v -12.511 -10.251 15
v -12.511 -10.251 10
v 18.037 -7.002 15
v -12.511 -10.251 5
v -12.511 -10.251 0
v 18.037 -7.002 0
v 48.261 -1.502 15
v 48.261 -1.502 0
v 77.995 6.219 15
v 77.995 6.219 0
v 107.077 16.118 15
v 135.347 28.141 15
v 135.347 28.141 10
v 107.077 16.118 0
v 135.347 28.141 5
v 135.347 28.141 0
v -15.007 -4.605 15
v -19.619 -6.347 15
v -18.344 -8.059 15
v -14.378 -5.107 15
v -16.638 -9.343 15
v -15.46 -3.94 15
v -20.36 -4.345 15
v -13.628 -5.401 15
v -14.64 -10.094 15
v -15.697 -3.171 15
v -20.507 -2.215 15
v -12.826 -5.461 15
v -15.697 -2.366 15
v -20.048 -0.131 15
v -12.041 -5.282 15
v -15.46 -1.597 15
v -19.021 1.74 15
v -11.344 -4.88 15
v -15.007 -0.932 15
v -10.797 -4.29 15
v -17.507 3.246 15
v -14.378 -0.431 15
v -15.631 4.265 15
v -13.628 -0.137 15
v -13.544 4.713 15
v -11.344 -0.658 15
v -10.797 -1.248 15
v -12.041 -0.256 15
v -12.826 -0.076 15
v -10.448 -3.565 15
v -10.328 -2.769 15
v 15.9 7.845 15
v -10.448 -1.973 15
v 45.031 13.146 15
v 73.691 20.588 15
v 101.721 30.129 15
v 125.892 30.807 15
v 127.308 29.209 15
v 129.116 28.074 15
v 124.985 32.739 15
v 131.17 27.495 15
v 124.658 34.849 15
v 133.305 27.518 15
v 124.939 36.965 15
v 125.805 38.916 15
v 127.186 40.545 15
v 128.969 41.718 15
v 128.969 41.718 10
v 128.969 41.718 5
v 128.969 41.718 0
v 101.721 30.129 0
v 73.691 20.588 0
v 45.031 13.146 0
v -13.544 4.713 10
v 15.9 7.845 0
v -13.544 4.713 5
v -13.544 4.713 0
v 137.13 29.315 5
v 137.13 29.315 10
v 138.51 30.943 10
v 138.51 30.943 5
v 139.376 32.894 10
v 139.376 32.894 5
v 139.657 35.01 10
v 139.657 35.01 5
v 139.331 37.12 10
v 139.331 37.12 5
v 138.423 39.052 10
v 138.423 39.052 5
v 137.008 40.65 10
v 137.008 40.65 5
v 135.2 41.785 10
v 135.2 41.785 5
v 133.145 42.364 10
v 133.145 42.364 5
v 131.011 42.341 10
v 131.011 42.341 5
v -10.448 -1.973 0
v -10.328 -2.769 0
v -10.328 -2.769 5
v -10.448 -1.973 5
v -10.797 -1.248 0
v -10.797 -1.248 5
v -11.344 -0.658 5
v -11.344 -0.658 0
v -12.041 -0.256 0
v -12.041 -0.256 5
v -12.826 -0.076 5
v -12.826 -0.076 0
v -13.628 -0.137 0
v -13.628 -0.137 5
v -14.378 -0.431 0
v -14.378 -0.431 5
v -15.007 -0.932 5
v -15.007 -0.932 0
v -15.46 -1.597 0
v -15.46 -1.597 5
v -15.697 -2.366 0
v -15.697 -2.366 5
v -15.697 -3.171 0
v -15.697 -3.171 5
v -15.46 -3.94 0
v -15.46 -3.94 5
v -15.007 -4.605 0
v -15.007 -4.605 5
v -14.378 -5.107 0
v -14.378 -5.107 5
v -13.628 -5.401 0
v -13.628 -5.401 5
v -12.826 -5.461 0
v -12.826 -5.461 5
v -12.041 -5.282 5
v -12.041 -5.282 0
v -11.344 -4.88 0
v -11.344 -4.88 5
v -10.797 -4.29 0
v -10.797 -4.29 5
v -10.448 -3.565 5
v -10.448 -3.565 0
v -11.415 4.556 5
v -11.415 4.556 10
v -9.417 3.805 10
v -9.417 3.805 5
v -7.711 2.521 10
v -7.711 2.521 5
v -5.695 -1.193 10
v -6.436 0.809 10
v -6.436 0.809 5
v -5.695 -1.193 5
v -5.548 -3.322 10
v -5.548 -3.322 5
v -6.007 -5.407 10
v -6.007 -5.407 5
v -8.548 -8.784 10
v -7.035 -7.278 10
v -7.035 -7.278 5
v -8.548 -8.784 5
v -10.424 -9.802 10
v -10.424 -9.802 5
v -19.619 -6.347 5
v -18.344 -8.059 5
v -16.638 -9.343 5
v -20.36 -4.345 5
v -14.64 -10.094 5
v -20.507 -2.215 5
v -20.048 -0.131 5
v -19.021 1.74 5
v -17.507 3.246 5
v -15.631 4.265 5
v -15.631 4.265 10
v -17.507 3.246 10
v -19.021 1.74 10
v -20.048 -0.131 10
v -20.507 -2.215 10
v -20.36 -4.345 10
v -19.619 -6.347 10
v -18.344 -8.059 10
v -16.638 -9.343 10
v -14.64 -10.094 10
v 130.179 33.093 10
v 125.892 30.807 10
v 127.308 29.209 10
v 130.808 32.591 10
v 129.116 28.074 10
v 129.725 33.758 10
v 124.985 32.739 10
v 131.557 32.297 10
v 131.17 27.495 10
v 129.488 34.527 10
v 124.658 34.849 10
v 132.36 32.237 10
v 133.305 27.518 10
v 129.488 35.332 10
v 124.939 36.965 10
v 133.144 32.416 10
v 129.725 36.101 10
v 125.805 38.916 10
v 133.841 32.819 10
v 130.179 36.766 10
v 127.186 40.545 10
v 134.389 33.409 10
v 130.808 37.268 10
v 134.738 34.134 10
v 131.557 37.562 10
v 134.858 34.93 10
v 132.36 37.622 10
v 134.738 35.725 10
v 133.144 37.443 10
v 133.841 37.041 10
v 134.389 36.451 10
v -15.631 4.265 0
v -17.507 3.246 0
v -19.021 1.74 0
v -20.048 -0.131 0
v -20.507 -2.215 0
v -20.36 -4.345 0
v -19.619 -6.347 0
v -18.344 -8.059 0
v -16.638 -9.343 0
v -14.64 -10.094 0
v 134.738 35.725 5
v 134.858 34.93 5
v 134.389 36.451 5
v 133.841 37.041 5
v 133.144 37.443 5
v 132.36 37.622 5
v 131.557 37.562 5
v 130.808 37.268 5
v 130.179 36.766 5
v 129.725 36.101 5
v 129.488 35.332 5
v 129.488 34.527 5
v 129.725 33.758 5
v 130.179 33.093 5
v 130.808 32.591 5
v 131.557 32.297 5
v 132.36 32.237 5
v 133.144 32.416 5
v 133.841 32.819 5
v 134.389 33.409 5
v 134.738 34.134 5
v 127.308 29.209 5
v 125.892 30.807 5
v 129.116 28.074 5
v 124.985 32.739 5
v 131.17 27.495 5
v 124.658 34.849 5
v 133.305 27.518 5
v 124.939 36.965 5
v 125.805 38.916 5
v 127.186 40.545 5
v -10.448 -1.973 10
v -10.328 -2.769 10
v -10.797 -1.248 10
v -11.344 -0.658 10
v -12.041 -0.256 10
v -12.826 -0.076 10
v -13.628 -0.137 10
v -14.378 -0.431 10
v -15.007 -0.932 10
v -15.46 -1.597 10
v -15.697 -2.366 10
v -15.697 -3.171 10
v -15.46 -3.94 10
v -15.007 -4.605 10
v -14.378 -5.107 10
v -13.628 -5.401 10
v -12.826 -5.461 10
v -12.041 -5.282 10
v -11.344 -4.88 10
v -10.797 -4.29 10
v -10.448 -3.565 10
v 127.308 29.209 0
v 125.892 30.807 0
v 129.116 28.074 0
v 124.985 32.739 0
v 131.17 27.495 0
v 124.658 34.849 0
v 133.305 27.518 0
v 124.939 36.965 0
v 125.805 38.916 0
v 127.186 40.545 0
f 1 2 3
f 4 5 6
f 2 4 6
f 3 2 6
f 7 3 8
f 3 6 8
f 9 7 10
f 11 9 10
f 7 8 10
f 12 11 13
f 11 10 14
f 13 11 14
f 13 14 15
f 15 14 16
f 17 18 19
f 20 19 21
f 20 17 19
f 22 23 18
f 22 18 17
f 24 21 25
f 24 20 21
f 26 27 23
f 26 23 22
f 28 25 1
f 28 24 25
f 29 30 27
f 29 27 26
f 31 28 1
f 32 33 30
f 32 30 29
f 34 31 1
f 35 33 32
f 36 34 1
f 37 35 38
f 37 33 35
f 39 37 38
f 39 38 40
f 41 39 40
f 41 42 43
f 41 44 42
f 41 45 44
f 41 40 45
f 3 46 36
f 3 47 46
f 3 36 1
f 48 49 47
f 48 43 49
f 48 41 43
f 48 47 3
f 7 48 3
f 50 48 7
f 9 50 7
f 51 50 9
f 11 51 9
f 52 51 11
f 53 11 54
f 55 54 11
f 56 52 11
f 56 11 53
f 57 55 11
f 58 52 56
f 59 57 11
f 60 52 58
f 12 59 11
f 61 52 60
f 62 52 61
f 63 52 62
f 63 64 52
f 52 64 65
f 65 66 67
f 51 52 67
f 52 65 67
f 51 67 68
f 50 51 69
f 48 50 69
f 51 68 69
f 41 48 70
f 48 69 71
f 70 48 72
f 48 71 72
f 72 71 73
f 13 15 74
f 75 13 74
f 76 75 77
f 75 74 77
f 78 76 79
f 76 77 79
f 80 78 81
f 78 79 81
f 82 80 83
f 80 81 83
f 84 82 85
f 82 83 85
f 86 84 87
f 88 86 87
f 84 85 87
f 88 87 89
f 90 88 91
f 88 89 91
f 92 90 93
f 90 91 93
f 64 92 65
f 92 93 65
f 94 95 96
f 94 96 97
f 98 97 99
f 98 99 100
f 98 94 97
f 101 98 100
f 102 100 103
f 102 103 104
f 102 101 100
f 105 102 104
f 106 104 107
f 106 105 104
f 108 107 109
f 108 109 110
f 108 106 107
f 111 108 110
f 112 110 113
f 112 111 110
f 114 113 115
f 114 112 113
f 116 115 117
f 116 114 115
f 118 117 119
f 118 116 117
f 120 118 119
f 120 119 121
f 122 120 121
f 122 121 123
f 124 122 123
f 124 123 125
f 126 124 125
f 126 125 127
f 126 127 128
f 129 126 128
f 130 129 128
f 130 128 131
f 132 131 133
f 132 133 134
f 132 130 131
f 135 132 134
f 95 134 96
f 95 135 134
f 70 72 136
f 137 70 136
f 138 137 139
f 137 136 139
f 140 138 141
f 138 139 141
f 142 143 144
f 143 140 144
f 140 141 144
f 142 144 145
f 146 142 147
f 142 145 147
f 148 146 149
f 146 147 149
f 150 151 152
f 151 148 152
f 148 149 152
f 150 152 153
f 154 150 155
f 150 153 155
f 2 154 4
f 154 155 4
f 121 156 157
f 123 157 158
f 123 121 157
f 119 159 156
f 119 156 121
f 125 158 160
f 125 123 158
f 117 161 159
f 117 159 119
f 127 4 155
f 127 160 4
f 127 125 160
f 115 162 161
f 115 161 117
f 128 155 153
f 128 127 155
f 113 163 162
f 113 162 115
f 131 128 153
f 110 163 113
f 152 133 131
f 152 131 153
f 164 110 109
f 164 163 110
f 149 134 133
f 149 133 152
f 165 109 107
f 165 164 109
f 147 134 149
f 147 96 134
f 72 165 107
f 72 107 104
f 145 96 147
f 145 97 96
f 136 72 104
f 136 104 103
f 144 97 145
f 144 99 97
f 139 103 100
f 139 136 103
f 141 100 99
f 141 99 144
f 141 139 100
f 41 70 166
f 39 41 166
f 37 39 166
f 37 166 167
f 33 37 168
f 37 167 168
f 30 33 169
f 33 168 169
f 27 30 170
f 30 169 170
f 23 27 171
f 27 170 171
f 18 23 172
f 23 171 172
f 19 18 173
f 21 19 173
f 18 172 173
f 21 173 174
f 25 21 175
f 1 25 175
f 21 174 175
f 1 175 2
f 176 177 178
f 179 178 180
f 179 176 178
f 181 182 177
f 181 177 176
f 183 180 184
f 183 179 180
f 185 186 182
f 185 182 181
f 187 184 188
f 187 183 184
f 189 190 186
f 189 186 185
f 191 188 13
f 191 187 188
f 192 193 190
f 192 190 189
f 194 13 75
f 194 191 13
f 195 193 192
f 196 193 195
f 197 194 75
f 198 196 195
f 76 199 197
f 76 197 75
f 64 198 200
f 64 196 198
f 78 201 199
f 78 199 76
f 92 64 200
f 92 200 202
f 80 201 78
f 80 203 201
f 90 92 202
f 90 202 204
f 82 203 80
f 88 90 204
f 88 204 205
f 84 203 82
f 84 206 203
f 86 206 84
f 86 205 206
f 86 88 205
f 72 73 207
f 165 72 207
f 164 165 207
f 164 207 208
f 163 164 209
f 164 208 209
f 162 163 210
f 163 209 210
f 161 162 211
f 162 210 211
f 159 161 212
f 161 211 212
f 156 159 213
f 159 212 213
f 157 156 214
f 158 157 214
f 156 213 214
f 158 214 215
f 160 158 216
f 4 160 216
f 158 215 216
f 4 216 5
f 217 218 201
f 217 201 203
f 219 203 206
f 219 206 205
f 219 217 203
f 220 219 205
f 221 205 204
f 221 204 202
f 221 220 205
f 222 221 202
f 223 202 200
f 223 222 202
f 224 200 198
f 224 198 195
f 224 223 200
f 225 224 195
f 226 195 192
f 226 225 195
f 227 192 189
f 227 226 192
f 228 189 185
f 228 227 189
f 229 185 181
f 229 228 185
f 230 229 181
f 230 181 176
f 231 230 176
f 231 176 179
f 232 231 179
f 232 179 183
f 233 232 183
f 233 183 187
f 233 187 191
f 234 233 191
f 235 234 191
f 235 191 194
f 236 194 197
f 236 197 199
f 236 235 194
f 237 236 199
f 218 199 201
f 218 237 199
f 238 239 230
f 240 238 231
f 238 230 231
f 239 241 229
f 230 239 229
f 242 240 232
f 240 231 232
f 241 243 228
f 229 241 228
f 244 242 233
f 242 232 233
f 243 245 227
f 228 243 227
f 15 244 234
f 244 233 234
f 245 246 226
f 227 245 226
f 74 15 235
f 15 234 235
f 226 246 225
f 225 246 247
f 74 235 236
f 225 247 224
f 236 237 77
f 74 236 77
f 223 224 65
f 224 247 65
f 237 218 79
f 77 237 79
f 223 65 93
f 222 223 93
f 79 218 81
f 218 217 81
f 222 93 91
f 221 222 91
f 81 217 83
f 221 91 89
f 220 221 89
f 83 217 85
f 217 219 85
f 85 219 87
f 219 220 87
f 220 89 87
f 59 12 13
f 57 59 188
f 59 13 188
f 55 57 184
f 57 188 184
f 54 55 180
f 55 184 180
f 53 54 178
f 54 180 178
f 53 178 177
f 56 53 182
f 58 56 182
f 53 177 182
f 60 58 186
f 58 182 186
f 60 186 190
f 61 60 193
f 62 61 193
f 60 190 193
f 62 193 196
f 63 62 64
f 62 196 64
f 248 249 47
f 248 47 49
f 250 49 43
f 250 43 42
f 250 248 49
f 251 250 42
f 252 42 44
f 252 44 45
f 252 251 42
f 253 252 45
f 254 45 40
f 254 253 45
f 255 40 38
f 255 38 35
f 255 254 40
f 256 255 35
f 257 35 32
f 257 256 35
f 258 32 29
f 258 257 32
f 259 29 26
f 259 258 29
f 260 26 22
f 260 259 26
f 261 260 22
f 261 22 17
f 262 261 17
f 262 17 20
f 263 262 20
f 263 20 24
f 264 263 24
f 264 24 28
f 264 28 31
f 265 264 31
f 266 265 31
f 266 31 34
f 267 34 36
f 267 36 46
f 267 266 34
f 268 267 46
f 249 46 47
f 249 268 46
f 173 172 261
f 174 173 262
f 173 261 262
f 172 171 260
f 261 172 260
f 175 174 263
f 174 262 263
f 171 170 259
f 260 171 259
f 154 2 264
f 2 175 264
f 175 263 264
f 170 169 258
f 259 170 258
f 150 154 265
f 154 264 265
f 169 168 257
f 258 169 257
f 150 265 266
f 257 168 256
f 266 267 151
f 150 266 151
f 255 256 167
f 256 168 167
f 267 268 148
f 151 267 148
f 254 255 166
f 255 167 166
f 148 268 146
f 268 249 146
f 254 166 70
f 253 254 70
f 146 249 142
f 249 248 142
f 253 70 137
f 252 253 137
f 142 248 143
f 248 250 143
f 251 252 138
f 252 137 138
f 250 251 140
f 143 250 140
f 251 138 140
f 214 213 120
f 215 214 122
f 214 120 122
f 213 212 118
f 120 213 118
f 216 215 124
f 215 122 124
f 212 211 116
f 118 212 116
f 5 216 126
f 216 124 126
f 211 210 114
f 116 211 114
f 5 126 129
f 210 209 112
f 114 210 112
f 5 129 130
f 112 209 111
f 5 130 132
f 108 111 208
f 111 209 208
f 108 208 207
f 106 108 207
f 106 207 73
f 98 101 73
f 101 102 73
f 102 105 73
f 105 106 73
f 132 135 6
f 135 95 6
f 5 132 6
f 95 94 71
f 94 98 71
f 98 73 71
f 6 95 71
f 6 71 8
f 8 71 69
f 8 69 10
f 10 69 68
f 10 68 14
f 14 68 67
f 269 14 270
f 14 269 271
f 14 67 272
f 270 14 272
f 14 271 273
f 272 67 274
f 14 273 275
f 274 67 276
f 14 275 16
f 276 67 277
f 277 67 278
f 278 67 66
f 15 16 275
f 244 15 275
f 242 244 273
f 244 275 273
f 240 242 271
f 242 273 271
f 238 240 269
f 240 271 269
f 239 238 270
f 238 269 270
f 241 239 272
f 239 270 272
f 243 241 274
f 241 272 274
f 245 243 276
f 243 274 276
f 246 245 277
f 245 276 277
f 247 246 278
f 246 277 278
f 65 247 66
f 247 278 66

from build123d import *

# Parameters (mm, degrees)
F1_DEPTH = 15
F0_R     = 2.7
F2_DEPTH = 5
F3_START = 10
F3_DEPTH = 5
F4_START = 5
F4_DEPTH = 5


with BuildPart() as f1:
    # F0 (on Top) → F1 (new body)
    with BuildSketch(Plane.XY):
        with BuildLine():
            ThreePointArc((128.9690721838, 41.7179030249), (59.4297181842, 16.601757413), (-13.5443023154, 4.7133236555))
            ThreePointArc((-13.5443023154, 4.7133236555), (-5.5454612916, -2.2522016138), (-12.5109865609, -10.2510426376))
            ThreePointArc((-12.5109865609, -10.2510426376), (63.1995597074, 2.0832073859), (135.346639482, 28.1412084582))
            ThreePointArc((135.346639482, 28.1412084582), (125.3695085496, 31.7407720924), (128.9690721838, 41.7179030249))
        make_face()
    extrude(amount=F1_DEPTH)

    # F0 (on Top) → F2 (join)
    with BuildSketch(Plane.XY):
        with BuildLine():
            ThreePointArc((-12.5109865609, -10.2510426376), (-5.5454612916, -2.2522016138), (-13.5443023154, 4.7133236555))
            ThreePointArc((-13.5443023154, 4.7133236555), (-20.5098275846, -3.2855173683), (-12.5109865609, -10.2510426376))
        make_face()
        with Locations((-13.0276444381, -2.768859491)):
            Circle(F0_R, mode=Mode.SUBTRACT)
    extrude(amount=F2_DEPTH)

    # F0 (on Top) → F3 (join)
    with BuildSketch(Plane.XY.offset(F3_START)):
        with BuildLine():
            ThreePointArc((-12.5109865609, -10.2510426376), (-5.5454612916, -2.2522016138), (-13.5443023154, 4.7133236555))
            ThreePointArc((-13.5443023154, 4.7133236555), (-20.5098275846, -3.2855173683), (-12.5109865609, -10.2510426376))
        make_face()
        with Locations((-13.0276444381, -2.768859491)):
            Circle(F0_R, mode=Mode.SUBTRACT)
    extrude(amount=F3_DEPTH)

    # F0 (on Top) → F4 (join)
    with BuildSketch(Plane.XY.offset(F4_START)):
        with BuildLine():
            ThreePointArc((135.346639482, 28.1412084582), (138.9462031162, 38.1183393907), (128.9690721838, 41.7179030249))
            ThreePointArc((128.9690721838, 41.7179030249), (125.3695085496, 31.7407720924), (135.346639482, 28.1412084582))
        make_face()
        with Locations((132.1578558329, 34.9295557416)):
            Circle(F0_R, mode=Mode.SUBTRACT)
    extrude(amount=F4_DEPTH)


solid = f1.part
